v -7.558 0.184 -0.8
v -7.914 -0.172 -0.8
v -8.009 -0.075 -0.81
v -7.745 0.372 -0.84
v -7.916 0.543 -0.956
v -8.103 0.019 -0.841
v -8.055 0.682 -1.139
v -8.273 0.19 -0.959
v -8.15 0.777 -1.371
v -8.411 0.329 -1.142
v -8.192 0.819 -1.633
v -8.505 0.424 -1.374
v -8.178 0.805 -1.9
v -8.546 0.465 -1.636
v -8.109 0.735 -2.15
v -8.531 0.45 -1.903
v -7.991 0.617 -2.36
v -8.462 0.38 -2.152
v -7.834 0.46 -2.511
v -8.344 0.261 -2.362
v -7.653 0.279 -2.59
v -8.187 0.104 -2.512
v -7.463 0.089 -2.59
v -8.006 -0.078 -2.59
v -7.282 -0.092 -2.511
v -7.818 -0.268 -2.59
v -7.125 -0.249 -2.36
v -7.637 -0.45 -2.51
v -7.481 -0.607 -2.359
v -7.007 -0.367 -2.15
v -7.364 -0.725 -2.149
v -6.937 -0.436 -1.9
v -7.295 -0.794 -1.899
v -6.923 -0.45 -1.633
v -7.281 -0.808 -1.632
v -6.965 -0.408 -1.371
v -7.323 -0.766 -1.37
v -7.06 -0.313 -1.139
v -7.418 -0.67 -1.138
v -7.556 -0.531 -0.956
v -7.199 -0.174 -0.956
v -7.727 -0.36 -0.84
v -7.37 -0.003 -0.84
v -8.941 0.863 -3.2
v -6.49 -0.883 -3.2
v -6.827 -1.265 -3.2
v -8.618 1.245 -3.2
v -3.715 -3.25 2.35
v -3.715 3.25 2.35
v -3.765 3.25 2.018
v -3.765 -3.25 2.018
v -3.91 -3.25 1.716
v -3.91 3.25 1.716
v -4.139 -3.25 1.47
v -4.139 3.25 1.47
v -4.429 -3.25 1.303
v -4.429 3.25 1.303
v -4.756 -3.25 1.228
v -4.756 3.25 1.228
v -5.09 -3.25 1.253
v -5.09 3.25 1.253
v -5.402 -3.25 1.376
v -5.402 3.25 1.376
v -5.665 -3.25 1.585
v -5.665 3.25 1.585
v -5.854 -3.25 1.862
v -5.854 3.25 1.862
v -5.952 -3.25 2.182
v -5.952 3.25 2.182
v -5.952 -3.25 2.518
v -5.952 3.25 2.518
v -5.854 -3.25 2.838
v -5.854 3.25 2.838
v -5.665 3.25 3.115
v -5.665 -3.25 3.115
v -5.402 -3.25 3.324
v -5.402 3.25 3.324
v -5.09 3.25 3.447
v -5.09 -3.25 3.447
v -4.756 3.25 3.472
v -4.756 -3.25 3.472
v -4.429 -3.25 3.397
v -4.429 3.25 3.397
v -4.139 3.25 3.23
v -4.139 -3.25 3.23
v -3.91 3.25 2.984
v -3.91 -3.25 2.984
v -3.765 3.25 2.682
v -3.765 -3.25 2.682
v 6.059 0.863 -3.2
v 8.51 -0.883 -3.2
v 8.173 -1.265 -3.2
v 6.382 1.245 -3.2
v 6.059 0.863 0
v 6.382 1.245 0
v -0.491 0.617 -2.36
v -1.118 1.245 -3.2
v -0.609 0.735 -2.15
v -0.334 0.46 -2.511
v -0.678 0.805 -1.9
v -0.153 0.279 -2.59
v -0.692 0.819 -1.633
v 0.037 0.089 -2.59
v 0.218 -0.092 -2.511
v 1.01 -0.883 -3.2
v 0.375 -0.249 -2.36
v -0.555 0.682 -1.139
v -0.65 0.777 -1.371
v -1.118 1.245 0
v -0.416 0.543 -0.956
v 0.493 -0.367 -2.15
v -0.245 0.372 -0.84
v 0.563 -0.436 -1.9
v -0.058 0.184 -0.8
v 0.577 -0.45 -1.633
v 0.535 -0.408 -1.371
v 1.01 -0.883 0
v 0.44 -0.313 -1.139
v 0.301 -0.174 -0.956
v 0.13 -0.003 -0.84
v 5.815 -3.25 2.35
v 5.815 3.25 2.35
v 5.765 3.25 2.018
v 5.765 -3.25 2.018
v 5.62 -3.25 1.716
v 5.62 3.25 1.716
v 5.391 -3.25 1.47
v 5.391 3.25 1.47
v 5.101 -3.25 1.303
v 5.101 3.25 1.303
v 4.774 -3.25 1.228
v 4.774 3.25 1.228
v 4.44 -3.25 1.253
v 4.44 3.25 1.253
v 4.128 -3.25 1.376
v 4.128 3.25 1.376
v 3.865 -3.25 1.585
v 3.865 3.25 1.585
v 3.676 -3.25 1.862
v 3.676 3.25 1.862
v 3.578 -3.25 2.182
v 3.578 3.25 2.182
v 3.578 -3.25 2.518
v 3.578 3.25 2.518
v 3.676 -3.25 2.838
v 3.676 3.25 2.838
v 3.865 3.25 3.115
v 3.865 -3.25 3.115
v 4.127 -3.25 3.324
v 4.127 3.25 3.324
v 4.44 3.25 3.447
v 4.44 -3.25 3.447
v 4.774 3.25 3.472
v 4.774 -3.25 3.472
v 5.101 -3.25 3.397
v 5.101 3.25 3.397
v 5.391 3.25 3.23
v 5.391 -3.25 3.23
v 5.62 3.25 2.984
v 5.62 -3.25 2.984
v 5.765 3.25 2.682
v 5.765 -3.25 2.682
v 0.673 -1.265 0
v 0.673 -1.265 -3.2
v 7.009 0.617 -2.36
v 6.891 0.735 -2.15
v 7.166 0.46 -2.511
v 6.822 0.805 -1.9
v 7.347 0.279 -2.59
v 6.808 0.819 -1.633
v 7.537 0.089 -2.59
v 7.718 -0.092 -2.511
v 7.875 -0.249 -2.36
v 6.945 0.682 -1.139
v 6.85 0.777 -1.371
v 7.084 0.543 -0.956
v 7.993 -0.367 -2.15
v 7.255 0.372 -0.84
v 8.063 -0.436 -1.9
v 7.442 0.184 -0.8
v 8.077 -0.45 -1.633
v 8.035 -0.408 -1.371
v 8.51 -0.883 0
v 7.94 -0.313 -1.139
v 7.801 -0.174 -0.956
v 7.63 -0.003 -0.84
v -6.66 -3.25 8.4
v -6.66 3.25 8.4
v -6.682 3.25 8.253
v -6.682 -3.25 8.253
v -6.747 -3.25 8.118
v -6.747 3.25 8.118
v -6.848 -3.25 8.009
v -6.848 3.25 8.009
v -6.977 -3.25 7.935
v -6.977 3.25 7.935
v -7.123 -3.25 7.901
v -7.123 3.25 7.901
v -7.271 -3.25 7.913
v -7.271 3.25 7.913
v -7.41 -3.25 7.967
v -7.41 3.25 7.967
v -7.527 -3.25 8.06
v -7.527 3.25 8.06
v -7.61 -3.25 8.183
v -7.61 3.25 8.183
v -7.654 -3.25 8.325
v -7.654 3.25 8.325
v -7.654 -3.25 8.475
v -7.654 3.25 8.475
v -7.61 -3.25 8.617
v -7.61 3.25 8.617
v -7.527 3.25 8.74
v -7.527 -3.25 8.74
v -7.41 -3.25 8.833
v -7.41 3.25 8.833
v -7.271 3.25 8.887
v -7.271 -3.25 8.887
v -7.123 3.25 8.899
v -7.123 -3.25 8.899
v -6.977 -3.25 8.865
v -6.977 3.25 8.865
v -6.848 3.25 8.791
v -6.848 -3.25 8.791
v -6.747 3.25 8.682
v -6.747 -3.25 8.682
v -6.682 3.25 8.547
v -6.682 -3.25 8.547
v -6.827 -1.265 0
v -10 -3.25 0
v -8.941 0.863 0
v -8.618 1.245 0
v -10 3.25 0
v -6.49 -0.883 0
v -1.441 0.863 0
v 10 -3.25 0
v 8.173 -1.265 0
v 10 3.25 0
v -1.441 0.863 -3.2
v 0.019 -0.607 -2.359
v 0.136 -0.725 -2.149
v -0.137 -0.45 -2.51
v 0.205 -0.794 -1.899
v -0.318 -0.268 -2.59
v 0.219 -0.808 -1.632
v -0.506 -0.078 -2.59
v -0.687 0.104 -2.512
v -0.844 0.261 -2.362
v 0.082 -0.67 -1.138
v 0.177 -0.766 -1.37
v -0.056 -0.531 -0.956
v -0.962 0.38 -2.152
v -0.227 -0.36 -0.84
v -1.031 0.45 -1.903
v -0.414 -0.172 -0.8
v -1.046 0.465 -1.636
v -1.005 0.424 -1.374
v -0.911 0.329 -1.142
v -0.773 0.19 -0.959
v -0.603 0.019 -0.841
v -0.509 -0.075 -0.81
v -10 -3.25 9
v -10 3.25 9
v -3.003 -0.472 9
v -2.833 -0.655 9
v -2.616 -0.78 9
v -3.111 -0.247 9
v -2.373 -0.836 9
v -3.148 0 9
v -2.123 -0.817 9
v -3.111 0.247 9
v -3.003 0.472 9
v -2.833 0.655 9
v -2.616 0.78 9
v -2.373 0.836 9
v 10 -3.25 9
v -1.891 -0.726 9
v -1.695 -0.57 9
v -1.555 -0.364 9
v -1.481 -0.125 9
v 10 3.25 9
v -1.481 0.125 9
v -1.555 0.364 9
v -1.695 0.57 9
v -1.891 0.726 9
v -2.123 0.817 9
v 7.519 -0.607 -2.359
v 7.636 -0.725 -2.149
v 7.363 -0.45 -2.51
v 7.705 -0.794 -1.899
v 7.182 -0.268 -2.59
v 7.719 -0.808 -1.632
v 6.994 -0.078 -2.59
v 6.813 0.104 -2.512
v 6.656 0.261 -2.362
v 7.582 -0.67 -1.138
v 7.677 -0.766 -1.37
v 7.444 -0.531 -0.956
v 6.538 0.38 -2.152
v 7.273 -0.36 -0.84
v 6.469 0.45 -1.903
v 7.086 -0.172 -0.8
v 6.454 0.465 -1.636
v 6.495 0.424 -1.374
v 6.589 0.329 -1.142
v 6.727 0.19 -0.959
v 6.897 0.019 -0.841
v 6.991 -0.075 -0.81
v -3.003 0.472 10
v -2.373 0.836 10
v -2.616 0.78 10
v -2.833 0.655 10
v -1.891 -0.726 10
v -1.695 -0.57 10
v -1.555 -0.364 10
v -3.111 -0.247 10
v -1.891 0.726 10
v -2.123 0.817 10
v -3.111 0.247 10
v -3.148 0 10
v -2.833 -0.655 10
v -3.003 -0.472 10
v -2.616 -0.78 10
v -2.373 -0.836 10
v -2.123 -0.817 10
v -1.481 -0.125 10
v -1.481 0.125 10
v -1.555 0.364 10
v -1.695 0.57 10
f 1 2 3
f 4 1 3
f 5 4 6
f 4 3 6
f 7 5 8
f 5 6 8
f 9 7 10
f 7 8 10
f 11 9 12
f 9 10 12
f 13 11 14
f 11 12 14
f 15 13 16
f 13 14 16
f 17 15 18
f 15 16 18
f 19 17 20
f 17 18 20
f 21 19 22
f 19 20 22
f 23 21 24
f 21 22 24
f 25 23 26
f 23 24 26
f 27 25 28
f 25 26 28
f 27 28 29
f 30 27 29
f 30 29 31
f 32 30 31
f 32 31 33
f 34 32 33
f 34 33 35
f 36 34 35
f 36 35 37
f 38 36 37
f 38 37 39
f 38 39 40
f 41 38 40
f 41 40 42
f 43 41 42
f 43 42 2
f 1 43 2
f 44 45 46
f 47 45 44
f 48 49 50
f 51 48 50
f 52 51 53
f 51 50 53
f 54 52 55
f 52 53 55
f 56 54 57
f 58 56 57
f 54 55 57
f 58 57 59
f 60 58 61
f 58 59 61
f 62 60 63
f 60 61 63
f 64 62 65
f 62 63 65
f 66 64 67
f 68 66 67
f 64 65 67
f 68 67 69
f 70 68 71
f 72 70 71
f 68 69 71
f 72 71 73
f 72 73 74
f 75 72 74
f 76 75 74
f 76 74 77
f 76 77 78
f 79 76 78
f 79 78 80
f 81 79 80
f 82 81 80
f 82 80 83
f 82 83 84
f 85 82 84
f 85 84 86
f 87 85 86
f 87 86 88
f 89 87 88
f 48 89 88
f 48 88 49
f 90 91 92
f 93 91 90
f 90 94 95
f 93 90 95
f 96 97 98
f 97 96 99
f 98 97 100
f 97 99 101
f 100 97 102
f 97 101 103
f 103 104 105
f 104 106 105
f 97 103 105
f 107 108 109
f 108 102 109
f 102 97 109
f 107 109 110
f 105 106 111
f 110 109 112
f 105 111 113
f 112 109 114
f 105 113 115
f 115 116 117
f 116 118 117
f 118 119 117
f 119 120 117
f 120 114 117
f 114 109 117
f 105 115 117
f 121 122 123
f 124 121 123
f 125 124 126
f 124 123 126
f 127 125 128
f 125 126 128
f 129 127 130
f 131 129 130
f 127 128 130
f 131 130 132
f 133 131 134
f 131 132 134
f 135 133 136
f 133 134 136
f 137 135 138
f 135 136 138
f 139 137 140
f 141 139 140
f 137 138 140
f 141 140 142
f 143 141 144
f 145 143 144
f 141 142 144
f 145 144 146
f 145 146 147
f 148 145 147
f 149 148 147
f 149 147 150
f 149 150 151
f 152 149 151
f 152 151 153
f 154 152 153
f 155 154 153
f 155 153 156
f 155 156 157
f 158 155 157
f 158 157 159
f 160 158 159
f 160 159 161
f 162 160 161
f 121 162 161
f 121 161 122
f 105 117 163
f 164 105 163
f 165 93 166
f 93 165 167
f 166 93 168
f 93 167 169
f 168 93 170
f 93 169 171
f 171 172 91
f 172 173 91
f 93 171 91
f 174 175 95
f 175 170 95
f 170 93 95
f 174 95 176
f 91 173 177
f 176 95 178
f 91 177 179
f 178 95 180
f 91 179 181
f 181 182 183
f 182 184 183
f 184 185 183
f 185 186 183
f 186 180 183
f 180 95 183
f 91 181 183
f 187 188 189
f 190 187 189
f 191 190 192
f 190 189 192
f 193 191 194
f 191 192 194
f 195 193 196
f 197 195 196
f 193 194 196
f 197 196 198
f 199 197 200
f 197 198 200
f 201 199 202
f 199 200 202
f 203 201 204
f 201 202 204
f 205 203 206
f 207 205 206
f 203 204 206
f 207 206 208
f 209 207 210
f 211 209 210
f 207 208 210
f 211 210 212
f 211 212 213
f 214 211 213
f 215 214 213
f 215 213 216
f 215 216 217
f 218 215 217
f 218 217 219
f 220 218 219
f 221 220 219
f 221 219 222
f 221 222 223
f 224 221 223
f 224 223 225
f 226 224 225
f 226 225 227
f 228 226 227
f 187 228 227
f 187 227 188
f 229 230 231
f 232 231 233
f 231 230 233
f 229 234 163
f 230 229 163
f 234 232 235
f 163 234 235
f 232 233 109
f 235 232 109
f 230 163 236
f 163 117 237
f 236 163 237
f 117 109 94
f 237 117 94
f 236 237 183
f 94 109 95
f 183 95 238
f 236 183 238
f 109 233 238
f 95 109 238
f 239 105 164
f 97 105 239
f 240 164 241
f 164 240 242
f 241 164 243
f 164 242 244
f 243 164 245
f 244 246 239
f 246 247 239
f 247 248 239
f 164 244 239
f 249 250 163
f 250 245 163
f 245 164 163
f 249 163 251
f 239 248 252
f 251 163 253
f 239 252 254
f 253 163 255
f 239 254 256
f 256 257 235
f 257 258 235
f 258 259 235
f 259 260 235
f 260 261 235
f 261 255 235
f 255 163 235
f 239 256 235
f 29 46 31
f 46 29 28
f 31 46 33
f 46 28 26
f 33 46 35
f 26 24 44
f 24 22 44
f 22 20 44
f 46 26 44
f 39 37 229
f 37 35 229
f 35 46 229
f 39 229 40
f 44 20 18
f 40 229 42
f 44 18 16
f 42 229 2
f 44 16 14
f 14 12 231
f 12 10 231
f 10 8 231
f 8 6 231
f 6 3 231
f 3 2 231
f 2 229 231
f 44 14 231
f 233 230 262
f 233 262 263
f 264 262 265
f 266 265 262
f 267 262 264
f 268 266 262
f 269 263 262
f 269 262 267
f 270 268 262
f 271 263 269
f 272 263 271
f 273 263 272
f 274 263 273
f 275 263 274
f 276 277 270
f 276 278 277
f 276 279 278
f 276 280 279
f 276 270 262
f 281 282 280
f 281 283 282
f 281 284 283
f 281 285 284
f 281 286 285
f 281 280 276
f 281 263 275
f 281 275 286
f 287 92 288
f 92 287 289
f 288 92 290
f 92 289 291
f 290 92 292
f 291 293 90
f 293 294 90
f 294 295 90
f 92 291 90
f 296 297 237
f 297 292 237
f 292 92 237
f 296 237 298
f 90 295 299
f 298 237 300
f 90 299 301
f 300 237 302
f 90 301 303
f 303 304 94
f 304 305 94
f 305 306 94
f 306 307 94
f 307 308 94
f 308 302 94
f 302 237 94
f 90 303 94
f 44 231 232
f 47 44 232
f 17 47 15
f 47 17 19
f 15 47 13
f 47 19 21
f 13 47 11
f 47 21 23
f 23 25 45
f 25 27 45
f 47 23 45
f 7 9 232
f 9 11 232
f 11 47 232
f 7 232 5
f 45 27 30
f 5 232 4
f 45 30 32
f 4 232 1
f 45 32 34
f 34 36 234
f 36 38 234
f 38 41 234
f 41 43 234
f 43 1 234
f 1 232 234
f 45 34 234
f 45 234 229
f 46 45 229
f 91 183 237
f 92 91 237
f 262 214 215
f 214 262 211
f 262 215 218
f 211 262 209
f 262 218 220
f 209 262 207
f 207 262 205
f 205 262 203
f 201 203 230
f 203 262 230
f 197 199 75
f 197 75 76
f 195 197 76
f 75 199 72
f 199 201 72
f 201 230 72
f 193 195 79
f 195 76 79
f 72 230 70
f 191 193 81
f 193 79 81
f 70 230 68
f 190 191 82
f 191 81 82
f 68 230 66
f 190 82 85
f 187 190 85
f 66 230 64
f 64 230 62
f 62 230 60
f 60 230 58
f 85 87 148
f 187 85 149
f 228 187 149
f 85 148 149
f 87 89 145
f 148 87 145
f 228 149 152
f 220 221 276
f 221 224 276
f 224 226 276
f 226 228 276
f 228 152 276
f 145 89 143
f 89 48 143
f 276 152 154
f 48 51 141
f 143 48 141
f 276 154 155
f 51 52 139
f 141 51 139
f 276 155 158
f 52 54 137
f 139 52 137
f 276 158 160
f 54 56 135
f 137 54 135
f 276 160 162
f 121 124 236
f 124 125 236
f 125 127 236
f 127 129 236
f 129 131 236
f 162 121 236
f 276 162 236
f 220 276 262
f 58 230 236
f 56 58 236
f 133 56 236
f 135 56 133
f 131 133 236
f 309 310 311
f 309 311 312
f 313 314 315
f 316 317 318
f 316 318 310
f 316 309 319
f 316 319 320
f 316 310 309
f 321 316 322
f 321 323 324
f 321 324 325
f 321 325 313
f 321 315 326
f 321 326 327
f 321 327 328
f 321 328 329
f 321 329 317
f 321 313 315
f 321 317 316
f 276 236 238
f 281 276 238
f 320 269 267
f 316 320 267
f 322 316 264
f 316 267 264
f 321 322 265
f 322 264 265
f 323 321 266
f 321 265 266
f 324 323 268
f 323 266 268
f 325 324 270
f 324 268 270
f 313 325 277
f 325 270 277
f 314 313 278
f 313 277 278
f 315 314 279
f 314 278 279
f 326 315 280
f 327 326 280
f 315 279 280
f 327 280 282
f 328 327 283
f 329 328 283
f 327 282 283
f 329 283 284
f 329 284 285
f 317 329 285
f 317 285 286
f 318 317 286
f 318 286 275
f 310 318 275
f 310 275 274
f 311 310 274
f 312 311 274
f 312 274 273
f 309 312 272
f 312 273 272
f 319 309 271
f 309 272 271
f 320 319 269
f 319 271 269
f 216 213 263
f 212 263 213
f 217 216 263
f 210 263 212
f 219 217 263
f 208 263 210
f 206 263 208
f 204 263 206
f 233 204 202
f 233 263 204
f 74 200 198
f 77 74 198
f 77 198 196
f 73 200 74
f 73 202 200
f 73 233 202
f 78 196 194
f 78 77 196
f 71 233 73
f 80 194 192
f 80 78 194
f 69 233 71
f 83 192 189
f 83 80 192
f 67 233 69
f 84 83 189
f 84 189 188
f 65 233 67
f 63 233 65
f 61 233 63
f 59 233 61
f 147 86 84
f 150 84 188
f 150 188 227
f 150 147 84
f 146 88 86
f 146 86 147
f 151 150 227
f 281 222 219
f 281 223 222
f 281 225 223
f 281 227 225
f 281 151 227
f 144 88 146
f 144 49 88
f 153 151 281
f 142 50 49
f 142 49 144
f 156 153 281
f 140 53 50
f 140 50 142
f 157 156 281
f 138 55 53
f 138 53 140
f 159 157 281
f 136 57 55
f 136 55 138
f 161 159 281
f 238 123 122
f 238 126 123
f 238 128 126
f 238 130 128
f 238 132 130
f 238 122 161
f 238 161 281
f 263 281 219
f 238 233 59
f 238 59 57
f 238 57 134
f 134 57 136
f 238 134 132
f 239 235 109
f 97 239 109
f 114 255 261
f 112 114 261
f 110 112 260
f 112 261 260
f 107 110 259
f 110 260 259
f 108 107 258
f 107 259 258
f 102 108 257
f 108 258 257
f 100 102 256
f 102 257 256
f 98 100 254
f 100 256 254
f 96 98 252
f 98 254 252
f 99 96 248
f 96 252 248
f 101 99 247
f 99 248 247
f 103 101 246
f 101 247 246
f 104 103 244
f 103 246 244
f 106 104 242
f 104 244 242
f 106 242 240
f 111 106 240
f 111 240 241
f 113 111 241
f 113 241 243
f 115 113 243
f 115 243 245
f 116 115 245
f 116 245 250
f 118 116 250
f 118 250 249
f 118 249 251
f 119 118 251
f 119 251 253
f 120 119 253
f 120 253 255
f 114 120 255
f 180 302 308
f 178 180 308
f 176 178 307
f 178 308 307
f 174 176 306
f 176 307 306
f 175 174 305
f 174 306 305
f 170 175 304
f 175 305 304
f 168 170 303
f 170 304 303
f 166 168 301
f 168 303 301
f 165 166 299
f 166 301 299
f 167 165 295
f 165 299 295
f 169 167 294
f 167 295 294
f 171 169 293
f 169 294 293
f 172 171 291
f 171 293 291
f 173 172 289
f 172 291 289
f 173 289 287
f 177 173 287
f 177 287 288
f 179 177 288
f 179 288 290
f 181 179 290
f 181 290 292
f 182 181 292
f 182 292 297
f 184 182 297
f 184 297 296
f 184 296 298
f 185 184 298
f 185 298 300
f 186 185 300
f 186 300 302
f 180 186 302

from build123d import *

# Parameters (mm, degrees)
SKETCH_1_W             = 20
SKETCH_1_H             = 6.5
EXTRUDE_1_DEPTH        = 9
HOLE_WIZARD_1_D        = 2.25
SKETCH_7_R             = 0.838393999
EXTRUDE_2_DEPTH        = 1
HOLE_WIZARD_2_D        = 1
EXTRUDE_3_DEPTH        = 3.2
HOLE_WIZARD_3_D        = 1.8
HOLE_WIZARD_3_DEPTH    = 6.5
PATTERN_LINEAR_1_COUNT = 3
PATTERN_LINEAR_1_PITCH = 7.5


with BuildPart() as part:
    # ｽｹｯﾁ1 → ﾎﾞｽ - 押し出し1 (new body)
    with BuildSketch(Plane.XY):
        Rectangle(SKETCH_1_W, SKETCH_1_H)
    extrude(amount=EXTRUDE_1_DEPTH)

    # 穴1 (through all)
    with Locations(Plane(origin=(0, -3.25, 0), x_dir=(-1, 0, 0), z_dir=(0, -1, 0))):
        with Locations((4.84, -2.35), (-4.69, -2.35)):
            Hole(HOLE_WIZARD_1_D / 2)

    # ｽｹｯﾁ7 → ﾎﾞｽ - 押し出し2 (add)
    with BuildSketch(Plane.XY.offset(9)):
        with Locations(Location((-2.31, 0, 0), (0, 0, 180))):
            Circle(SKETCH_7_R)
    extrude(amount=EXTRUDE_2_DEPTH)

    # 穴2 (through all)
    with Locations(Plane(origin=(0, -3.25, 0), x_dir=(-1, 0, 0), z_dir=(0, -1, 0))):
        with Locations((7.16, -8.4)):
            Hole(HOLE_WIZARD_2_D / 2)

    # ｽｹｯﾁ10 → ﾎﾞｽ - 押し出し3 (add)
    with BuildSketch(Plane(origin=(0, 0, 0), x_dir=(-1, 0, 0), z_dir=(0, 0, -1))):
        Polygon((-6.381555021, 1.244871931), (-8.509905901, -0.883478949), (-8.172897935, -1.265123133), (-6.058582994, 0.863179555), align=None)
    extrude_3 = extrude(amount=EXTRUDE_3_DEPTH)

    # 穴3
    with Locations(Plane(origin=(3.813213476, 3.813213476, 0), x_dir=(0, 0, -1), z_dir=(0.7071067811865488, 0.7071067811865462, 0))):
        with Locations((1.7, -5.132183446)):
            hole_wizard_3 = Hole(HOLE_WIZARD_3_D / 2, depth=HOLE_WIZARD_3_DEPTH)

    # 直線ﾊﾟﾀｰﾝ1: ﾎﾞｽ - 押し出し3, 穴3 ×3
    with Locations(*[(-i * PATTERN_LINEAR_1_PITCH, 0, 0) for i in range(1, PATTERN_LINEAR_1_COUNT)]):
        add(extrude_3)
        add(hole_wizard_3, mode=Mode.SUBTRACT)


solid = part.part
